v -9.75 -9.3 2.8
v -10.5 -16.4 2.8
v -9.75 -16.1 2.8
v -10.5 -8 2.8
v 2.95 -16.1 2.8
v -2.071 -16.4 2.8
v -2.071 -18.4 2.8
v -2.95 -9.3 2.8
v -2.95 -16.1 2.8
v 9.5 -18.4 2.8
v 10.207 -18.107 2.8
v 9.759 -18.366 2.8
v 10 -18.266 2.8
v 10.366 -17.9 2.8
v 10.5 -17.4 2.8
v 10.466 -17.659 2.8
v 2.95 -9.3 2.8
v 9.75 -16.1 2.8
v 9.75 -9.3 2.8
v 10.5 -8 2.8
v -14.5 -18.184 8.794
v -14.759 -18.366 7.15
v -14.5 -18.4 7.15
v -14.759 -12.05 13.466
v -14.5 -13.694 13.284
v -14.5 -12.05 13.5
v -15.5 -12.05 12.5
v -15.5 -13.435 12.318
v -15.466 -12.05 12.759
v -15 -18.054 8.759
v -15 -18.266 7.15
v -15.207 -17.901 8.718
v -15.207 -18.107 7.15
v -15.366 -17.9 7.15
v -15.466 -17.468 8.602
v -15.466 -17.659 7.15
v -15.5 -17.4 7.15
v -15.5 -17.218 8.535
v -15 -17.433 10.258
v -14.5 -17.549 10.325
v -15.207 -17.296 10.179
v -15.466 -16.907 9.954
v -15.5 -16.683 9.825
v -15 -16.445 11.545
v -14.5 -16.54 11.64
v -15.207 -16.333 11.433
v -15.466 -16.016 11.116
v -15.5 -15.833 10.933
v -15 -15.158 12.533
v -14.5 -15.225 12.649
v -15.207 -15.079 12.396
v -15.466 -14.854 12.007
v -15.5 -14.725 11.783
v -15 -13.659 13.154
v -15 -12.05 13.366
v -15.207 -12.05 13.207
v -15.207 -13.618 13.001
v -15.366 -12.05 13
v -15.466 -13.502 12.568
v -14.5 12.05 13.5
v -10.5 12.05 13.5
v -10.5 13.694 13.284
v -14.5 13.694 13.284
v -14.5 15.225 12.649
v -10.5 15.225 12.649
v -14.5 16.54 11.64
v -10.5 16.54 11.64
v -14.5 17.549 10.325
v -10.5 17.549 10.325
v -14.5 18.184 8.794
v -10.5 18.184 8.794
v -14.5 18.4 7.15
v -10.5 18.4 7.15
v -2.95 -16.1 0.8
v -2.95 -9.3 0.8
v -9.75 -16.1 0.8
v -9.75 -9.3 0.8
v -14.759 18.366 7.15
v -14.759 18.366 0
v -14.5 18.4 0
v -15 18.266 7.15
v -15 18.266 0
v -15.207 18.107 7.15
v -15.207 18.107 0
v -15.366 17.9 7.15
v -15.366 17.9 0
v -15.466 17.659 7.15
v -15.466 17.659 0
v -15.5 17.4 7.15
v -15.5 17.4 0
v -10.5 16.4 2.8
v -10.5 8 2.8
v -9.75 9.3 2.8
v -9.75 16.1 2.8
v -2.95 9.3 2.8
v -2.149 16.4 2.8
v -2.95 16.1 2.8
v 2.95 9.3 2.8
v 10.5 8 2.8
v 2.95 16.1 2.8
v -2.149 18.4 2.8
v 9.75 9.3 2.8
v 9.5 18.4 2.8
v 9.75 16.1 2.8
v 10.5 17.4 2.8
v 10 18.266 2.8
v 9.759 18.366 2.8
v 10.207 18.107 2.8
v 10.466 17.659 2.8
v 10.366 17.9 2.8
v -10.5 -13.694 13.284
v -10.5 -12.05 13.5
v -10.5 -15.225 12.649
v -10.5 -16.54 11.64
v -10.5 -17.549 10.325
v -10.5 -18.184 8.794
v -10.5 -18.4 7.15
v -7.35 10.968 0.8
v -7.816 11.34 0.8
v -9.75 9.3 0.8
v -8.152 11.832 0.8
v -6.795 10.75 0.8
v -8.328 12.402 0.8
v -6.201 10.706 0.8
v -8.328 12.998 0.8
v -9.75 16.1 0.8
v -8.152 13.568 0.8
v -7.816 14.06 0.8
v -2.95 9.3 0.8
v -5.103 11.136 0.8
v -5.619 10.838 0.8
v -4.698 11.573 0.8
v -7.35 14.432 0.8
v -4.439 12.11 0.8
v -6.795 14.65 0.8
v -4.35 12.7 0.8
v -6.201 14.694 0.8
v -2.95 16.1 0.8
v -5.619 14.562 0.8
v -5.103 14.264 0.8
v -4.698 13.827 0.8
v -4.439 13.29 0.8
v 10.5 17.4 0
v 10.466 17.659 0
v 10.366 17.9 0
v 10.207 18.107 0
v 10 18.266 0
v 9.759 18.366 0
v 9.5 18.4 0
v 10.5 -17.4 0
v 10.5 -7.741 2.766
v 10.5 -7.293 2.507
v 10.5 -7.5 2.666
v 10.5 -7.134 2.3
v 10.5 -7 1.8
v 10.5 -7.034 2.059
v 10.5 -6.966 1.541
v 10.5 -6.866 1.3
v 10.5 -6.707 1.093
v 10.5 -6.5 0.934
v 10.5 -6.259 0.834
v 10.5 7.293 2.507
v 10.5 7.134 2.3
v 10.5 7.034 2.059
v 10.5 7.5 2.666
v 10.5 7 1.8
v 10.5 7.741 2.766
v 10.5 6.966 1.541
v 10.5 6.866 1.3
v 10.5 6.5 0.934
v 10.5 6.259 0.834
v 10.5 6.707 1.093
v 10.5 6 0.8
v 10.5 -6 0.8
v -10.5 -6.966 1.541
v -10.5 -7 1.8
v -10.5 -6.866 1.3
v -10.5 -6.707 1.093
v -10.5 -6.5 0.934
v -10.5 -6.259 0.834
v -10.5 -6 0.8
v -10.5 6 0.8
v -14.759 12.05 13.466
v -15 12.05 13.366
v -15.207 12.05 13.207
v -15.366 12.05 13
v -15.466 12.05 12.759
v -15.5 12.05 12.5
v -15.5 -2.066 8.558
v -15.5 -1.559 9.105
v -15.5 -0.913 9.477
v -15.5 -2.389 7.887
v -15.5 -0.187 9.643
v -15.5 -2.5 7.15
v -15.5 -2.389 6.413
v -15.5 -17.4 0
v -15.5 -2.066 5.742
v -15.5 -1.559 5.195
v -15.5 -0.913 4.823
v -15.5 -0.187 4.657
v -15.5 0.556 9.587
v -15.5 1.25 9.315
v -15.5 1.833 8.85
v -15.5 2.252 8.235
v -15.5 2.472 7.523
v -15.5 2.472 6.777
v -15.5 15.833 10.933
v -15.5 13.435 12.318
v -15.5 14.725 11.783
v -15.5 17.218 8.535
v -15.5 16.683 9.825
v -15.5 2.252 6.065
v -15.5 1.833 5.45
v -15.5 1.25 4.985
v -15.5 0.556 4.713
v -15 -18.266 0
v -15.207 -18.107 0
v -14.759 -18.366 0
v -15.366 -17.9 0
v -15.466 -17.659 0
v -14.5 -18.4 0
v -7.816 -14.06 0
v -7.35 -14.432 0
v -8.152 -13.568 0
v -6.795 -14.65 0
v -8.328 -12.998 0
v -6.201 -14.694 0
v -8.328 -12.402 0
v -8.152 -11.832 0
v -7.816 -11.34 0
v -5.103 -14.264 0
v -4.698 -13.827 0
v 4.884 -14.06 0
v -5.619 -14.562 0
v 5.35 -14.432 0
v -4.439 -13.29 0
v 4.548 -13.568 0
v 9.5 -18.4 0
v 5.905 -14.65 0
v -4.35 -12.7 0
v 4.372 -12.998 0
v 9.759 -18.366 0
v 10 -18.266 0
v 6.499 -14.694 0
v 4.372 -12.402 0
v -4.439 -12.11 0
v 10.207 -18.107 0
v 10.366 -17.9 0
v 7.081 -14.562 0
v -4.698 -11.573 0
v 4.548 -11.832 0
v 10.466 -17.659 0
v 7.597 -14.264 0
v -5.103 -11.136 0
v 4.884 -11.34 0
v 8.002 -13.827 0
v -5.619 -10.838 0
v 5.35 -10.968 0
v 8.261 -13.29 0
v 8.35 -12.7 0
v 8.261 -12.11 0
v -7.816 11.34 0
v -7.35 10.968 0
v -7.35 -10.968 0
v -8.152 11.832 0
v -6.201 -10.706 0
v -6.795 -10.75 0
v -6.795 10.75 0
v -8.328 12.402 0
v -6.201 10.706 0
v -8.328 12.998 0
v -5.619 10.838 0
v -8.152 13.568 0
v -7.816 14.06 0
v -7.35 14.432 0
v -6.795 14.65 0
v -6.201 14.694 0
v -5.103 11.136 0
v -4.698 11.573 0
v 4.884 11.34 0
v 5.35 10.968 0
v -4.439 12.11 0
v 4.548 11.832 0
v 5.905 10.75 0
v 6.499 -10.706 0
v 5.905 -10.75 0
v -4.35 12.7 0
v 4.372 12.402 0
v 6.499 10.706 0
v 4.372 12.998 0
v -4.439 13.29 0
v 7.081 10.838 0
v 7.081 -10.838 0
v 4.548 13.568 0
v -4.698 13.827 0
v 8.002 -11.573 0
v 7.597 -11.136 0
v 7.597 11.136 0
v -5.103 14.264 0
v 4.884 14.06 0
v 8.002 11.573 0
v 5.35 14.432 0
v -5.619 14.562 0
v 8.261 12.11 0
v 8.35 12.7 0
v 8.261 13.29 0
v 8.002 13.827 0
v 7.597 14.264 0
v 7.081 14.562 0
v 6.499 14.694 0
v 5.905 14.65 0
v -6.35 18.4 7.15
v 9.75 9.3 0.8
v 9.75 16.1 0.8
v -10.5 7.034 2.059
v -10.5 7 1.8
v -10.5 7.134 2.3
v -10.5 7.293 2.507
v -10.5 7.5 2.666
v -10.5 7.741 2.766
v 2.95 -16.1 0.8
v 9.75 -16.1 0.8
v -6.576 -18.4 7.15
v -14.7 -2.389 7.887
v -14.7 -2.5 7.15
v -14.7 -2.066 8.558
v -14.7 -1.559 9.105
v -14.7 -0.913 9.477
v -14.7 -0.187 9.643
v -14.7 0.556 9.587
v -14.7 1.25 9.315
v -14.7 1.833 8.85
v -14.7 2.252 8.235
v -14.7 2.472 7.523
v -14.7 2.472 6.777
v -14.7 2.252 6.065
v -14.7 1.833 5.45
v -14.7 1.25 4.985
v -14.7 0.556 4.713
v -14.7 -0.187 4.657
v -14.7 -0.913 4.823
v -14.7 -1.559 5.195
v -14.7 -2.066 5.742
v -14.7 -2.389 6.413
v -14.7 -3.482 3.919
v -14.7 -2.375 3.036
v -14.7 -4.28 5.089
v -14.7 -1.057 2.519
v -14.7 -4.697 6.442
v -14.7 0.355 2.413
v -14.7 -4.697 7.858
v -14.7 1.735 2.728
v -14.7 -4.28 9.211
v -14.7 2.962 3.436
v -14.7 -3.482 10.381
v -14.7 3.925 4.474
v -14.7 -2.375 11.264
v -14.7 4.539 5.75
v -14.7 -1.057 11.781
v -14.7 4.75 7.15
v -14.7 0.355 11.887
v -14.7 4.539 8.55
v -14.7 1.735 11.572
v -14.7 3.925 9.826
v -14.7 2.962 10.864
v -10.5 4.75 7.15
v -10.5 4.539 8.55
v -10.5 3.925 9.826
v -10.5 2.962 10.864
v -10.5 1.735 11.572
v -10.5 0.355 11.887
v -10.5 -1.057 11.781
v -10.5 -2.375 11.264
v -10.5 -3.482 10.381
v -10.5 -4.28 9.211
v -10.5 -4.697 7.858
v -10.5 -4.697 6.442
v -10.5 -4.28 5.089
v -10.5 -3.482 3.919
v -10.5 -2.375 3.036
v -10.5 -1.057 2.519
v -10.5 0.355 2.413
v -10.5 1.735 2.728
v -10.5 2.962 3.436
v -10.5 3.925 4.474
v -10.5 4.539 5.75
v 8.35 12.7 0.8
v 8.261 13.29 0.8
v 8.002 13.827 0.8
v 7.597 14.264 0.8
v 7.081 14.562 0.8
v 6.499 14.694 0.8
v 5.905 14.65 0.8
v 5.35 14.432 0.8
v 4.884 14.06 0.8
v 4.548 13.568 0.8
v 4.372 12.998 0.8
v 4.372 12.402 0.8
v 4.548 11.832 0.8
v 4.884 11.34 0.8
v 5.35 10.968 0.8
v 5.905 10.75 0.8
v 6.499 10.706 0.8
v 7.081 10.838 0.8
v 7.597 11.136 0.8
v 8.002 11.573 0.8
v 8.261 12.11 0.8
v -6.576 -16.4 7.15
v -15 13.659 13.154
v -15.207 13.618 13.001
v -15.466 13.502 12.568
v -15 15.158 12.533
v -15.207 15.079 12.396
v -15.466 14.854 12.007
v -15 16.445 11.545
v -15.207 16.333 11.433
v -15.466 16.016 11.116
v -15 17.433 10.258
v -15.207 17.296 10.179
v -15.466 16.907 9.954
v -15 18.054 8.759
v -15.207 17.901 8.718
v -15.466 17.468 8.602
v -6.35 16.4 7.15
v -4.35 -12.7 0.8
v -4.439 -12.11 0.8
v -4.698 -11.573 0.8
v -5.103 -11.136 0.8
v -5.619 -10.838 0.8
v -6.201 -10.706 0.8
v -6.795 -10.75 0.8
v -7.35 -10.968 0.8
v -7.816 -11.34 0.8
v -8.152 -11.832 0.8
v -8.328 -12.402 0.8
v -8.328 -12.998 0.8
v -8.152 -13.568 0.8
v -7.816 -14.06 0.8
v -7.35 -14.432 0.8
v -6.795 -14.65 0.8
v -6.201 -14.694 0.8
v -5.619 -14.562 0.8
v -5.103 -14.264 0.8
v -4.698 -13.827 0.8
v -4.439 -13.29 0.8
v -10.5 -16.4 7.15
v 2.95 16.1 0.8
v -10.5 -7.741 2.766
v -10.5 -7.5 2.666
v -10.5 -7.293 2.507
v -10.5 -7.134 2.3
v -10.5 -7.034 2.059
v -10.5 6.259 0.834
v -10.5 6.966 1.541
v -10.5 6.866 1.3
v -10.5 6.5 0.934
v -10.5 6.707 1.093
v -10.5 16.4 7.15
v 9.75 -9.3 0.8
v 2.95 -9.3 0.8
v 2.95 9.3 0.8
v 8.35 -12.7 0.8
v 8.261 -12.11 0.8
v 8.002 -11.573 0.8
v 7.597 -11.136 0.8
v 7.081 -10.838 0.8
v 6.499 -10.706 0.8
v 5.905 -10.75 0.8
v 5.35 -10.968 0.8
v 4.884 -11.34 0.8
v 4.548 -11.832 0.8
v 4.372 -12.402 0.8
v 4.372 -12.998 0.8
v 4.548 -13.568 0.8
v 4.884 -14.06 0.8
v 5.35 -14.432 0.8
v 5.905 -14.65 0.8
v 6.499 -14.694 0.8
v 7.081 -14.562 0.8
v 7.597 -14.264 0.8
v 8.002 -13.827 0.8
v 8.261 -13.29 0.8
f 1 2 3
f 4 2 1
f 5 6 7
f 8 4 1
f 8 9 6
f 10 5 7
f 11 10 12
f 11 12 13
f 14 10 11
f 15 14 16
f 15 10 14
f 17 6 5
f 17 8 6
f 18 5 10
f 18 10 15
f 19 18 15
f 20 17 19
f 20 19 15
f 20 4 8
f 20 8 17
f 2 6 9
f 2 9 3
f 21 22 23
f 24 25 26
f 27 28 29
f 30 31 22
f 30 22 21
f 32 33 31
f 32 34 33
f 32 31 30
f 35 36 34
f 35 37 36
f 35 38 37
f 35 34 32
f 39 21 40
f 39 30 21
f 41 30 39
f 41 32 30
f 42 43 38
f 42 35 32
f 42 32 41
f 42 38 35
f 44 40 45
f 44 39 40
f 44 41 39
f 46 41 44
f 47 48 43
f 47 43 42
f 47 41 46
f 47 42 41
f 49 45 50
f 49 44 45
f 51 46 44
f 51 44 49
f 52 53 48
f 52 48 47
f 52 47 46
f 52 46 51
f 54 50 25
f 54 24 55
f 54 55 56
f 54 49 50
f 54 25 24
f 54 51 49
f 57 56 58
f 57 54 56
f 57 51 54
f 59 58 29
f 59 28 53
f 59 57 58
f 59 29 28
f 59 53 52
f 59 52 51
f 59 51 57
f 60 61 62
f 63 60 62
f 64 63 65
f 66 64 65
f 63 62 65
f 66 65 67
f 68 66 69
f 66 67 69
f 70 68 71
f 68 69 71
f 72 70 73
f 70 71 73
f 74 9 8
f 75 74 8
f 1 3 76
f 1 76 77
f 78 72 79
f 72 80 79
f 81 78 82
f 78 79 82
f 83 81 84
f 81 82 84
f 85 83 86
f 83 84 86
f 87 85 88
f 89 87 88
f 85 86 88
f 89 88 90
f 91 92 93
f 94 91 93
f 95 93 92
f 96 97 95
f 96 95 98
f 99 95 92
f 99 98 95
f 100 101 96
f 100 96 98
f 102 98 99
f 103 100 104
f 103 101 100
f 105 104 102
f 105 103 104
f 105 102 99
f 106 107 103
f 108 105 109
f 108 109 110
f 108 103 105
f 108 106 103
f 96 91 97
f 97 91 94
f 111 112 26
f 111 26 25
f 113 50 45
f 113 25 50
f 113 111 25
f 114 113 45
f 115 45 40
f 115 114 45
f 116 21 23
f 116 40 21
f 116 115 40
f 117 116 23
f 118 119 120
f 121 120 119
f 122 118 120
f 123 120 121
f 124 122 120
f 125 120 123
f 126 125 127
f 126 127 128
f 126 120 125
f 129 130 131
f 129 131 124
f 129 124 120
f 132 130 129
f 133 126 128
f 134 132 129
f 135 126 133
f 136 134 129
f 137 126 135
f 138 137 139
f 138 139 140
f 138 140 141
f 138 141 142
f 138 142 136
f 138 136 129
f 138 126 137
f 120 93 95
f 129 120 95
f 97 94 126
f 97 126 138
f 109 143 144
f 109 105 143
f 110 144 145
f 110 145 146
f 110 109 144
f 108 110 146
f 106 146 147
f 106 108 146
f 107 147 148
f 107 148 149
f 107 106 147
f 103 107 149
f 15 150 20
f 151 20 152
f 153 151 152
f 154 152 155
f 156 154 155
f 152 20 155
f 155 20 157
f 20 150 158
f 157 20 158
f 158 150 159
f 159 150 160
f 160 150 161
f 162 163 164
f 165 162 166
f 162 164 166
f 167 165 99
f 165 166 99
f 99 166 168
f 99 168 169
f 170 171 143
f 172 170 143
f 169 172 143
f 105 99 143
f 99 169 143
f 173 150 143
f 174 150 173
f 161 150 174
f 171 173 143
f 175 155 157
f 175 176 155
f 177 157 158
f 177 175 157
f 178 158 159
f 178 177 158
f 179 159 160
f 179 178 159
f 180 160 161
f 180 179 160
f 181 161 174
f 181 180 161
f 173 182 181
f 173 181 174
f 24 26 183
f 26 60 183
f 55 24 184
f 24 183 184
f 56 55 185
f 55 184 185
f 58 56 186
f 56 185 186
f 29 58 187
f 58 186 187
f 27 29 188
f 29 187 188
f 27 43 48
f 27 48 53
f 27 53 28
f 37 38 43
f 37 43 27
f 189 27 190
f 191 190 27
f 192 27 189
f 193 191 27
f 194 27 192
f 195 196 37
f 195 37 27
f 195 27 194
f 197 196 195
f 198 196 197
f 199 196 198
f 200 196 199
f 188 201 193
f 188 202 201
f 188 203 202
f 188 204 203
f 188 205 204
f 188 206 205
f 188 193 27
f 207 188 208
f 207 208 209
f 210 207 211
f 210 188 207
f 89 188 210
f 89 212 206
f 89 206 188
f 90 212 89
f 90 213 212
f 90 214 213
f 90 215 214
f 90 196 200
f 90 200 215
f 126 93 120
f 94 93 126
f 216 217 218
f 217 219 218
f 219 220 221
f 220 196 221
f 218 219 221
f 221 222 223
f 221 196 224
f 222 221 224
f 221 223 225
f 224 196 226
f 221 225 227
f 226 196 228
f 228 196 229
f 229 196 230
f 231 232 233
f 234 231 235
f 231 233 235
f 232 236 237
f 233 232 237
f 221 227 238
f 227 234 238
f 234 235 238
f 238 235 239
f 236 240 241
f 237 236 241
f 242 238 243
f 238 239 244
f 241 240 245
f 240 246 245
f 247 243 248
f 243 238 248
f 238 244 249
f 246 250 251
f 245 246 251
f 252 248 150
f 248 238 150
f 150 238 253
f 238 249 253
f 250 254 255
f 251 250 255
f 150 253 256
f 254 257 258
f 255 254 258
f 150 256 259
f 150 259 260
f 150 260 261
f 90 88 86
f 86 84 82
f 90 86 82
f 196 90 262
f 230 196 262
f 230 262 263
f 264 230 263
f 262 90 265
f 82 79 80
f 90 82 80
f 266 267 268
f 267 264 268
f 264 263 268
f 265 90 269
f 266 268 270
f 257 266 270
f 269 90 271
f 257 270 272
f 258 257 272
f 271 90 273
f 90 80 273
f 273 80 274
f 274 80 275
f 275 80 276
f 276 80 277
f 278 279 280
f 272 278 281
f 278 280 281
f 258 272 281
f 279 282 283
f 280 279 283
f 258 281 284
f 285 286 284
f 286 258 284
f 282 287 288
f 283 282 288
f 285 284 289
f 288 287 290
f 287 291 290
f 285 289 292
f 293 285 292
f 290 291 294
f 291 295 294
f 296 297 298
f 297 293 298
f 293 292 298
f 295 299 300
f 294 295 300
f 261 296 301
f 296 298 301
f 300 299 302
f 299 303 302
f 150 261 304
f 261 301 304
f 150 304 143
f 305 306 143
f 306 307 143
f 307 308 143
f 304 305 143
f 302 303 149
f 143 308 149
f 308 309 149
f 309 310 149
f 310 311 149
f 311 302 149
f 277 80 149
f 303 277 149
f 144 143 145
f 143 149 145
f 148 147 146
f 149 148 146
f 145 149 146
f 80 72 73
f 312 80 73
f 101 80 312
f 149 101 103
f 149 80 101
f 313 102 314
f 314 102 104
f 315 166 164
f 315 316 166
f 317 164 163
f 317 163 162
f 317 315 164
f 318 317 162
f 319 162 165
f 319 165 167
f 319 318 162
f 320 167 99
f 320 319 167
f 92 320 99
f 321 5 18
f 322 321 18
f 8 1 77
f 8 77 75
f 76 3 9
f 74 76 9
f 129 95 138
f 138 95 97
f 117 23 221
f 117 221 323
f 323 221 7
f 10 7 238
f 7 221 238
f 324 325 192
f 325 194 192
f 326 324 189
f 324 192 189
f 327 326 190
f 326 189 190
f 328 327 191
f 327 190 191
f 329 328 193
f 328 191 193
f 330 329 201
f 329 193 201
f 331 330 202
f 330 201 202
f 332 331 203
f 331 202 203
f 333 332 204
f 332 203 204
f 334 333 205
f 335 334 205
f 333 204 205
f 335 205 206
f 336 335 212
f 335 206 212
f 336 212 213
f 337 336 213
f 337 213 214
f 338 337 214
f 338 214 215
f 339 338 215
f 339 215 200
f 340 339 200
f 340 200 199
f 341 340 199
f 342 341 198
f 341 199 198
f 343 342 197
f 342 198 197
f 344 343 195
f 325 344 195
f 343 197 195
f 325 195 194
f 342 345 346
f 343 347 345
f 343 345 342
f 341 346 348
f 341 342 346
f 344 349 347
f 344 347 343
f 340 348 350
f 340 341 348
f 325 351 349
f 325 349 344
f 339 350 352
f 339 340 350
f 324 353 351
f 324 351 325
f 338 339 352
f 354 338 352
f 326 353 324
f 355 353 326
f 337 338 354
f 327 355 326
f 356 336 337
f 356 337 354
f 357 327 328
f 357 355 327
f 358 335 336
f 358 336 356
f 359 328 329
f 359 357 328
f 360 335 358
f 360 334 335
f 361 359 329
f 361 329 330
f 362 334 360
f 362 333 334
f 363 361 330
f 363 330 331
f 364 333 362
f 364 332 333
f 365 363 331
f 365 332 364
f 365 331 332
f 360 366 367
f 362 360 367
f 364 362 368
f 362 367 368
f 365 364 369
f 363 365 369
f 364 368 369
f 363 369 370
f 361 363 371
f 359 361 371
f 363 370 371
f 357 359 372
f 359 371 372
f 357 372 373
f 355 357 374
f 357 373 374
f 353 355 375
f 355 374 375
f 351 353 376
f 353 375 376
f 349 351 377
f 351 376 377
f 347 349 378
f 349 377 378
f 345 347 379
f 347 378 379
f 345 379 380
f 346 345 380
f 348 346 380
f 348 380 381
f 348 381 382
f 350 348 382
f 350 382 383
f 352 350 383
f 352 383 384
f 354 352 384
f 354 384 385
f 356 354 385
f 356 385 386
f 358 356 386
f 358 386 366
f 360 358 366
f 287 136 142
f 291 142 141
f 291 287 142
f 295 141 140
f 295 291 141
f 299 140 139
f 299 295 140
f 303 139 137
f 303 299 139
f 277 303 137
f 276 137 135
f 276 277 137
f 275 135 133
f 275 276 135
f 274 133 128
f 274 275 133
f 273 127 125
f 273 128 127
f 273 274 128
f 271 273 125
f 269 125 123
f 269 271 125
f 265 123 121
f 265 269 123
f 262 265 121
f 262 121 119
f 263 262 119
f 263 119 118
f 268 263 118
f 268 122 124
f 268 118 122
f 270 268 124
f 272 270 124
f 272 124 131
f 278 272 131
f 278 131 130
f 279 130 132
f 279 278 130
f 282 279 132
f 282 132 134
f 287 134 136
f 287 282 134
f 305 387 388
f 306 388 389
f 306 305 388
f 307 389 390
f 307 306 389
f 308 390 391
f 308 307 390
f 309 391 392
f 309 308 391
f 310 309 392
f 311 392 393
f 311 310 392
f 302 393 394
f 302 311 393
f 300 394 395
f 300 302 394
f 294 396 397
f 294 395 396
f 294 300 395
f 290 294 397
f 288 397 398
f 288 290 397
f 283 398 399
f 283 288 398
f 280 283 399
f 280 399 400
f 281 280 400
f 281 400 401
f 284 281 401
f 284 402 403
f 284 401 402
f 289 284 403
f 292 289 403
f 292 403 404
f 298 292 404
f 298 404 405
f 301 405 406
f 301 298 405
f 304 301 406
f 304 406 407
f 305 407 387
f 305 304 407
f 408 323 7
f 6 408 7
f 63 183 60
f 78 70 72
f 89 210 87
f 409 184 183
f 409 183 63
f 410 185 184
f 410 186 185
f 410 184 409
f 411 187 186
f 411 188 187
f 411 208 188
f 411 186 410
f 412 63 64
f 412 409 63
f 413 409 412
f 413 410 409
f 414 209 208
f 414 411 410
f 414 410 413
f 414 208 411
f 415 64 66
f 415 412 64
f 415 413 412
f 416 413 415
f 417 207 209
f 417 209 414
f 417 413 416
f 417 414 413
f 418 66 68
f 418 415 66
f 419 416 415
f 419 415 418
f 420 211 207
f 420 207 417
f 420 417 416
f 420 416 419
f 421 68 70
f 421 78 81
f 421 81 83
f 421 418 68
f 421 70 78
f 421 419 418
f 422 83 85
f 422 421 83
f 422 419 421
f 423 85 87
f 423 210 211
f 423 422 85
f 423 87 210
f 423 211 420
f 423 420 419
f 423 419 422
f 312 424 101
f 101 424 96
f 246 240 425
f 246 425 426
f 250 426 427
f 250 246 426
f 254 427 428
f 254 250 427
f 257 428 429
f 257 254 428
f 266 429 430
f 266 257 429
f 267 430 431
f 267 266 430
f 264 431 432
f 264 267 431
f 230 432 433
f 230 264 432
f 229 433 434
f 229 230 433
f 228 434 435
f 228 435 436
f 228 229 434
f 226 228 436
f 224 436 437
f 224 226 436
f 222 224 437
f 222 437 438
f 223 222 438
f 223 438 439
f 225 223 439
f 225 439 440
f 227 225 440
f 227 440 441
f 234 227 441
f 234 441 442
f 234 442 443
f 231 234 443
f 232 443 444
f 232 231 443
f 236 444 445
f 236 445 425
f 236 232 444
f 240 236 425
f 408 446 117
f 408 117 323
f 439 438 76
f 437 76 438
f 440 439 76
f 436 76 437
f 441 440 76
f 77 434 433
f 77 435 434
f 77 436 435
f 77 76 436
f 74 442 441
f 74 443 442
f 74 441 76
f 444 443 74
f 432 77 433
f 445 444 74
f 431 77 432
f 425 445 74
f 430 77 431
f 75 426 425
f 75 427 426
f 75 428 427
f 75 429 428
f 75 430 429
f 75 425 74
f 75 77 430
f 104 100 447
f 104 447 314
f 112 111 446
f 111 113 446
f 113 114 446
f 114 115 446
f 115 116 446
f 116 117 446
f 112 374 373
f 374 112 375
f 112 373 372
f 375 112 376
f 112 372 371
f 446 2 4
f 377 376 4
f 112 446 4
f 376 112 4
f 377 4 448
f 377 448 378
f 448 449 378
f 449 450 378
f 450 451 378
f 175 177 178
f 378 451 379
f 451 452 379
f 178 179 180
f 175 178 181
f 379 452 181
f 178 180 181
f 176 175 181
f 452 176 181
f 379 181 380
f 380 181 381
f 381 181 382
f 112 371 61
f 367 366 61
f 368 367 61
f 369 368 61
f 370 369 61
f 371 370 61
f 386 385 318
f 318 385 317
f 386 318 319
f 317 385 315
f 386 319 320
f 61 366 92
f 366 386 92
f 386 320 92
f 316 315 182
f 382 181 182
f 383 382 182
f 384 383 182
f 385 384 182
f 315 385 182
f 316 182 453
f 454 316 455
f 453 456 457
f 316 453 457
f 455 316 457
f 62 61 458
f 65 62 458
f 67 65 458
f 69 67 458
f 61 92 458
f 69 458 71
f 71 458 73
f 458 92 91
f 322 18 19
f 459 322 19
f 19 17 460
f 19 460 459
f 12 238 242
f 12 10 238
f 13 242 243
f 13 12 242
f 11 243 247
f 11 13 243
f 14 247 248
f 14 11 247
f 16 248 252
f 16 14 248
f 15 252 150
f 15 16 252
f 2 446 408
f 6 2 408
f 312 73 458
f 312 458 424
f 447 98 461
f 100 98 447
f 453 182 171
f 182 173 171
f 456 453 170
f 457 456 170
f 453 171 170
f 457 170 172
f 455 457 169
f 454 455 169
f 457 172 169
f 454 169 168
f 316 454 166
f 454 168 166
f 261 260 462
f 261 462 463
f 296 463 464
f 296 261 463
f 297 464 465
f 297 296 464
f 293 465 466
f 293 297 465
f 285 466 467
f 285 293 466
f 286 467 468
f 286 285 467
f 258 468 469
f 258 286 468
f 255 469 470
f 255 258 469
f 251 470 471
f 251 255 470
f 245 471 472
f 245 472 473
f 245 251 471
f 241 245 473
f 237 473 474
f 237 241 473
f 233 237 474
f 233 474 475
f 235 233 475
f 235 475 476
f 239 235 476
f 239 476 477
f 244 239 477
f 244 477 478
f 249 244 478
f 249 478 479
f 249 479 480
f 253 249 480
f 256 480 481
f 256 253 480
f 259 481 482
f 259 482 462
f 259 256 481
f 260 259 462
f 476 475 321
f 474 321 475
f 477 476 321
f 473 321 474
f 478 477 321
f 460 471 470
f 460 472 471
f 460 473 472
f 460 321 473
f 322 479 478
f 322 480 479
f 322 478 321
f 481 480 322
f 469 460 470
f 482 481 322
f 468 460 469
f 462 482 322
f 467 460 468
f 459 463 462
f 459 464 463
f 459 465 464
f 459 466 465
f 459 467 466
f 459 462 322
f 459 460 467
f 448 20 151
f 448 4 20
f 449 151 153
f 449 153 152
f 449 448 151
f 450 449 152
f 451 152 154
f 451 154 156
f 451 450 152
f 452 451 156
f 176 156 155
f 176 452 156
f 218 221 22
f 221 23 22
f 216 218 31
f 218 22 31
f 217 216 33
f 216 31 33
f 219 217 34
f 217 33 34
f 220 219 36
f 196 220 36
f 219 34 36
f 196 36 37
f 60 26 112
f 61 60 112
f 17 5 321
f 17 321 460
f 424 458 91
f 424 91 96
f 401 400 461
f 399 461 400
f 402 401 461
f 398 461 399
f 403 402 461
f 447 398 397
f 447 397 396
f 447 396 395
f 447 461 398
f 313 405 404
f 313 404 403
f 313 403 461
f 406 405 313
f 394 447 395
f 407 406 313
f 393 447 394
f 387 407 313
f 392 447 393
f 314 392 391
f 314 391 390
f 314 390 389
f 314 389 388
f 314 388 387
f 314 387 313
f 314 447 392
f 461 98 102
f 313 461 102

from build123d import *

# Parameters (mm, degrees)
F0_W           = 21
F0_H           = 36.8
F0_R           = 2
F1_DEPTH       = 0.8
F0_W_2         = 5
F2_DEPTH       = 13.5
F5_R           = 6.35
F6_D           = 5
F6_CBORE_D     = 9.5
F6_CBORE_DEPTH = 4.2
F7_W           = 10.5
F7_H           = 2
F7_R           = 2
F8_DEPTH       = 2
F9_DEPTH       = 6.35
F10_T4_DEPTH   = 35.8364431643
F10_T9_DEPTH   = 35.8364431643
F11_W          = 6.8
F11_H          = 6.8
F12_DEPTH      = 2
F13_R          = 0.99999


# Not quite as in the source:
# - a fillet or chamfer that OpenCascade refuses, or shapes differently, is made with other operations: its cross-section is extruded or revolved along the edge and cut away or added
# - a fillet or chamfer is up to 0.001 mm smaller than in the source, because OpenCascade refuses the exact size


with BuildPart() as f1:
    # F0 (on Top) → F1 (new body)
    with BuildSketch(Plane.XY):
        Rectangle(F0_W, F0_H)
        with Locations((-6.35, -12.7)):
            Circle(F0_R, mode=Mode.SUBTRACT)
        with Locations((6.35, -12.7)):
            Circle(F0_R, mode=Mode.SUBTRACT)
        with Locations((-6.35, 12.7)):
            Circle(F0_R, mode=Mode.SUBTRACT)
        with Locations((6.35, 12.7)):
            Circle(F0_R, mode=Mode.SUBTRACT)
    extrude(amount=F1_DEPTH)

    # F0 (on Top) → F2 (join)
    with BuildSketch(Plane.XY):
        with Locations((-13, 0)):
            Rectangle(F0_W_2, F0_H)
    extrude(amount=F2_DEPTH)

    # F5
    f5_edges = [f1.edges().sort_by_distance(p)[0] for p in [
        (-13, -18.4, 13.5),
        (-13, 18.4, 13.5),
    ]]
    fillet(f5_edges, radius=F5_R)

    # F6 (through all)
    with Locations(Plane.YZ.offset(-10.5)):
        with Locations((0, 7.15)):
            CounterBoreHole(F6_D / 2, F6_CBORE_D / 2, F6_CBORE_DEPTH)

    # F7 (on face) → F8 (join)
    with BuildSketch(Plane.XY.offset(0.8)):
        with Locations((-5.25, -17.4)):
            Rectangle(F7_W, F7_H)
        Polygon((-10.5, -16.4), (0, -16.4), (0, -18.4), (10.5, -18.4), (10.5, -7), (-10.5, -7), align=None)
        Polygon((-10.5, 16.4), (-10.5, 7), (10.5, 7), (10.5, 18.4), (0, 18.4), (0, 16.4), align=None)
        with Locations((-6.35, 12.7)):
            Circle(F7_R, mode=Mode.SUBTRACT)
        with Locations((6.35, 12.7)):
            Circle(F7_R, mode=Mode.SUBTRACT)
    extrude(amount=F8_DEPTH)

    # F7 (on face) → F9 (join)
    with BuildSketch(Plane.XY.offset(0.8)):
        with Locations((-5.25, -17.4)):
            Rectangle(F7_W, F7_H)
        with Locations((-5.25, 17.4)):
            Rectangle(F7_W, F7_H)
    extrude(amount=F9_DEPTH)

    # F10: chamfer of 6.35 x 6.5756174926 on 2 edges, made by hand


with BuildPart() as f10_tool2:
    # F10_s3 → F10_t4 (new body)
    with BuildSketch(Plane.XZ.offset(35.3182215821)):
        Polygon((-6.5756174926, 7.15), (0, 0.8), (0, 7.15), align=None)
    extrude(amount=-F10_T4_DEPTH)

    split(bisect_by=Plane.XY.offset(2.8), keep=Keep.TOP)


with BuildPart() as f1_1:
    add(f1.part)

    # F10_t1: cut F10_tool2
    add(f10_tool2.part, mode=Mode.SUBTRACT)


with BuildPart() as f10_tool7:
    # F10_s8 → F10_t9 (new body)
    with BuildSketch(Plane.XZ.offset(0.5182215821)):
        Polygon((-6.35, 7.15), (0, 0.5743825074), (0, 7.15), align=None)
    extrude(amount=-F10_T9_DEPTH)

    split(bisect_by=Plane.XY.offset(2.8), keep=Keep.TOP)


with BuildPart() as f1_2:
    add(f1_1.part)

    # F10_t6: cut F10_tool7
    add(f10_tool7.part, mode=Mode.SUBTRACT)

    # F11 (on face) → F12 (cut)
    with BuildSketch(Plane.XY.offset(2.8)):
        with Locations((-6.35, -12.7)):
            Rectangle(F11_W, F11_H)
        with Locations((6.35, -12.7)):
            Rectangle(F11_W, F11_H)
        with Locations((-6.35, 12.7)):
            Rectangle(F11_W, F11_H)
        with Locations((6.35, 12.7)):
            Rectangle(F11_W, F11_H)
    extrude(amount=-F12_DEPTH, mode=Mode.SUBTRACT)

    # F13 (radius 1 in the source; OpenCascade refuses exactly that, so slightly less here)
    f13_edges = [f1_2.edges().sort_by_distance(p)[0] for p in [
        (10.5, -18.4, 1.4),
        (10.5, 18.4, 1.4),
        (-15.5, -18.4, 3.575),
        (0, 7, 0.8),
        (0, -7, 0.8),
        (0, 7, 2.8),
        (0, -7, 2.8),
        (-15.5, 0, 13.5),
        (-15.5, -16.540128, 11.640128),
        (-15.5, 16.540128, 11.640128),
        (-15.5, 18.4, 3.575),
    ]]
    fillet(f13_edges, radius=F13_R)


solid = f1_2.part
